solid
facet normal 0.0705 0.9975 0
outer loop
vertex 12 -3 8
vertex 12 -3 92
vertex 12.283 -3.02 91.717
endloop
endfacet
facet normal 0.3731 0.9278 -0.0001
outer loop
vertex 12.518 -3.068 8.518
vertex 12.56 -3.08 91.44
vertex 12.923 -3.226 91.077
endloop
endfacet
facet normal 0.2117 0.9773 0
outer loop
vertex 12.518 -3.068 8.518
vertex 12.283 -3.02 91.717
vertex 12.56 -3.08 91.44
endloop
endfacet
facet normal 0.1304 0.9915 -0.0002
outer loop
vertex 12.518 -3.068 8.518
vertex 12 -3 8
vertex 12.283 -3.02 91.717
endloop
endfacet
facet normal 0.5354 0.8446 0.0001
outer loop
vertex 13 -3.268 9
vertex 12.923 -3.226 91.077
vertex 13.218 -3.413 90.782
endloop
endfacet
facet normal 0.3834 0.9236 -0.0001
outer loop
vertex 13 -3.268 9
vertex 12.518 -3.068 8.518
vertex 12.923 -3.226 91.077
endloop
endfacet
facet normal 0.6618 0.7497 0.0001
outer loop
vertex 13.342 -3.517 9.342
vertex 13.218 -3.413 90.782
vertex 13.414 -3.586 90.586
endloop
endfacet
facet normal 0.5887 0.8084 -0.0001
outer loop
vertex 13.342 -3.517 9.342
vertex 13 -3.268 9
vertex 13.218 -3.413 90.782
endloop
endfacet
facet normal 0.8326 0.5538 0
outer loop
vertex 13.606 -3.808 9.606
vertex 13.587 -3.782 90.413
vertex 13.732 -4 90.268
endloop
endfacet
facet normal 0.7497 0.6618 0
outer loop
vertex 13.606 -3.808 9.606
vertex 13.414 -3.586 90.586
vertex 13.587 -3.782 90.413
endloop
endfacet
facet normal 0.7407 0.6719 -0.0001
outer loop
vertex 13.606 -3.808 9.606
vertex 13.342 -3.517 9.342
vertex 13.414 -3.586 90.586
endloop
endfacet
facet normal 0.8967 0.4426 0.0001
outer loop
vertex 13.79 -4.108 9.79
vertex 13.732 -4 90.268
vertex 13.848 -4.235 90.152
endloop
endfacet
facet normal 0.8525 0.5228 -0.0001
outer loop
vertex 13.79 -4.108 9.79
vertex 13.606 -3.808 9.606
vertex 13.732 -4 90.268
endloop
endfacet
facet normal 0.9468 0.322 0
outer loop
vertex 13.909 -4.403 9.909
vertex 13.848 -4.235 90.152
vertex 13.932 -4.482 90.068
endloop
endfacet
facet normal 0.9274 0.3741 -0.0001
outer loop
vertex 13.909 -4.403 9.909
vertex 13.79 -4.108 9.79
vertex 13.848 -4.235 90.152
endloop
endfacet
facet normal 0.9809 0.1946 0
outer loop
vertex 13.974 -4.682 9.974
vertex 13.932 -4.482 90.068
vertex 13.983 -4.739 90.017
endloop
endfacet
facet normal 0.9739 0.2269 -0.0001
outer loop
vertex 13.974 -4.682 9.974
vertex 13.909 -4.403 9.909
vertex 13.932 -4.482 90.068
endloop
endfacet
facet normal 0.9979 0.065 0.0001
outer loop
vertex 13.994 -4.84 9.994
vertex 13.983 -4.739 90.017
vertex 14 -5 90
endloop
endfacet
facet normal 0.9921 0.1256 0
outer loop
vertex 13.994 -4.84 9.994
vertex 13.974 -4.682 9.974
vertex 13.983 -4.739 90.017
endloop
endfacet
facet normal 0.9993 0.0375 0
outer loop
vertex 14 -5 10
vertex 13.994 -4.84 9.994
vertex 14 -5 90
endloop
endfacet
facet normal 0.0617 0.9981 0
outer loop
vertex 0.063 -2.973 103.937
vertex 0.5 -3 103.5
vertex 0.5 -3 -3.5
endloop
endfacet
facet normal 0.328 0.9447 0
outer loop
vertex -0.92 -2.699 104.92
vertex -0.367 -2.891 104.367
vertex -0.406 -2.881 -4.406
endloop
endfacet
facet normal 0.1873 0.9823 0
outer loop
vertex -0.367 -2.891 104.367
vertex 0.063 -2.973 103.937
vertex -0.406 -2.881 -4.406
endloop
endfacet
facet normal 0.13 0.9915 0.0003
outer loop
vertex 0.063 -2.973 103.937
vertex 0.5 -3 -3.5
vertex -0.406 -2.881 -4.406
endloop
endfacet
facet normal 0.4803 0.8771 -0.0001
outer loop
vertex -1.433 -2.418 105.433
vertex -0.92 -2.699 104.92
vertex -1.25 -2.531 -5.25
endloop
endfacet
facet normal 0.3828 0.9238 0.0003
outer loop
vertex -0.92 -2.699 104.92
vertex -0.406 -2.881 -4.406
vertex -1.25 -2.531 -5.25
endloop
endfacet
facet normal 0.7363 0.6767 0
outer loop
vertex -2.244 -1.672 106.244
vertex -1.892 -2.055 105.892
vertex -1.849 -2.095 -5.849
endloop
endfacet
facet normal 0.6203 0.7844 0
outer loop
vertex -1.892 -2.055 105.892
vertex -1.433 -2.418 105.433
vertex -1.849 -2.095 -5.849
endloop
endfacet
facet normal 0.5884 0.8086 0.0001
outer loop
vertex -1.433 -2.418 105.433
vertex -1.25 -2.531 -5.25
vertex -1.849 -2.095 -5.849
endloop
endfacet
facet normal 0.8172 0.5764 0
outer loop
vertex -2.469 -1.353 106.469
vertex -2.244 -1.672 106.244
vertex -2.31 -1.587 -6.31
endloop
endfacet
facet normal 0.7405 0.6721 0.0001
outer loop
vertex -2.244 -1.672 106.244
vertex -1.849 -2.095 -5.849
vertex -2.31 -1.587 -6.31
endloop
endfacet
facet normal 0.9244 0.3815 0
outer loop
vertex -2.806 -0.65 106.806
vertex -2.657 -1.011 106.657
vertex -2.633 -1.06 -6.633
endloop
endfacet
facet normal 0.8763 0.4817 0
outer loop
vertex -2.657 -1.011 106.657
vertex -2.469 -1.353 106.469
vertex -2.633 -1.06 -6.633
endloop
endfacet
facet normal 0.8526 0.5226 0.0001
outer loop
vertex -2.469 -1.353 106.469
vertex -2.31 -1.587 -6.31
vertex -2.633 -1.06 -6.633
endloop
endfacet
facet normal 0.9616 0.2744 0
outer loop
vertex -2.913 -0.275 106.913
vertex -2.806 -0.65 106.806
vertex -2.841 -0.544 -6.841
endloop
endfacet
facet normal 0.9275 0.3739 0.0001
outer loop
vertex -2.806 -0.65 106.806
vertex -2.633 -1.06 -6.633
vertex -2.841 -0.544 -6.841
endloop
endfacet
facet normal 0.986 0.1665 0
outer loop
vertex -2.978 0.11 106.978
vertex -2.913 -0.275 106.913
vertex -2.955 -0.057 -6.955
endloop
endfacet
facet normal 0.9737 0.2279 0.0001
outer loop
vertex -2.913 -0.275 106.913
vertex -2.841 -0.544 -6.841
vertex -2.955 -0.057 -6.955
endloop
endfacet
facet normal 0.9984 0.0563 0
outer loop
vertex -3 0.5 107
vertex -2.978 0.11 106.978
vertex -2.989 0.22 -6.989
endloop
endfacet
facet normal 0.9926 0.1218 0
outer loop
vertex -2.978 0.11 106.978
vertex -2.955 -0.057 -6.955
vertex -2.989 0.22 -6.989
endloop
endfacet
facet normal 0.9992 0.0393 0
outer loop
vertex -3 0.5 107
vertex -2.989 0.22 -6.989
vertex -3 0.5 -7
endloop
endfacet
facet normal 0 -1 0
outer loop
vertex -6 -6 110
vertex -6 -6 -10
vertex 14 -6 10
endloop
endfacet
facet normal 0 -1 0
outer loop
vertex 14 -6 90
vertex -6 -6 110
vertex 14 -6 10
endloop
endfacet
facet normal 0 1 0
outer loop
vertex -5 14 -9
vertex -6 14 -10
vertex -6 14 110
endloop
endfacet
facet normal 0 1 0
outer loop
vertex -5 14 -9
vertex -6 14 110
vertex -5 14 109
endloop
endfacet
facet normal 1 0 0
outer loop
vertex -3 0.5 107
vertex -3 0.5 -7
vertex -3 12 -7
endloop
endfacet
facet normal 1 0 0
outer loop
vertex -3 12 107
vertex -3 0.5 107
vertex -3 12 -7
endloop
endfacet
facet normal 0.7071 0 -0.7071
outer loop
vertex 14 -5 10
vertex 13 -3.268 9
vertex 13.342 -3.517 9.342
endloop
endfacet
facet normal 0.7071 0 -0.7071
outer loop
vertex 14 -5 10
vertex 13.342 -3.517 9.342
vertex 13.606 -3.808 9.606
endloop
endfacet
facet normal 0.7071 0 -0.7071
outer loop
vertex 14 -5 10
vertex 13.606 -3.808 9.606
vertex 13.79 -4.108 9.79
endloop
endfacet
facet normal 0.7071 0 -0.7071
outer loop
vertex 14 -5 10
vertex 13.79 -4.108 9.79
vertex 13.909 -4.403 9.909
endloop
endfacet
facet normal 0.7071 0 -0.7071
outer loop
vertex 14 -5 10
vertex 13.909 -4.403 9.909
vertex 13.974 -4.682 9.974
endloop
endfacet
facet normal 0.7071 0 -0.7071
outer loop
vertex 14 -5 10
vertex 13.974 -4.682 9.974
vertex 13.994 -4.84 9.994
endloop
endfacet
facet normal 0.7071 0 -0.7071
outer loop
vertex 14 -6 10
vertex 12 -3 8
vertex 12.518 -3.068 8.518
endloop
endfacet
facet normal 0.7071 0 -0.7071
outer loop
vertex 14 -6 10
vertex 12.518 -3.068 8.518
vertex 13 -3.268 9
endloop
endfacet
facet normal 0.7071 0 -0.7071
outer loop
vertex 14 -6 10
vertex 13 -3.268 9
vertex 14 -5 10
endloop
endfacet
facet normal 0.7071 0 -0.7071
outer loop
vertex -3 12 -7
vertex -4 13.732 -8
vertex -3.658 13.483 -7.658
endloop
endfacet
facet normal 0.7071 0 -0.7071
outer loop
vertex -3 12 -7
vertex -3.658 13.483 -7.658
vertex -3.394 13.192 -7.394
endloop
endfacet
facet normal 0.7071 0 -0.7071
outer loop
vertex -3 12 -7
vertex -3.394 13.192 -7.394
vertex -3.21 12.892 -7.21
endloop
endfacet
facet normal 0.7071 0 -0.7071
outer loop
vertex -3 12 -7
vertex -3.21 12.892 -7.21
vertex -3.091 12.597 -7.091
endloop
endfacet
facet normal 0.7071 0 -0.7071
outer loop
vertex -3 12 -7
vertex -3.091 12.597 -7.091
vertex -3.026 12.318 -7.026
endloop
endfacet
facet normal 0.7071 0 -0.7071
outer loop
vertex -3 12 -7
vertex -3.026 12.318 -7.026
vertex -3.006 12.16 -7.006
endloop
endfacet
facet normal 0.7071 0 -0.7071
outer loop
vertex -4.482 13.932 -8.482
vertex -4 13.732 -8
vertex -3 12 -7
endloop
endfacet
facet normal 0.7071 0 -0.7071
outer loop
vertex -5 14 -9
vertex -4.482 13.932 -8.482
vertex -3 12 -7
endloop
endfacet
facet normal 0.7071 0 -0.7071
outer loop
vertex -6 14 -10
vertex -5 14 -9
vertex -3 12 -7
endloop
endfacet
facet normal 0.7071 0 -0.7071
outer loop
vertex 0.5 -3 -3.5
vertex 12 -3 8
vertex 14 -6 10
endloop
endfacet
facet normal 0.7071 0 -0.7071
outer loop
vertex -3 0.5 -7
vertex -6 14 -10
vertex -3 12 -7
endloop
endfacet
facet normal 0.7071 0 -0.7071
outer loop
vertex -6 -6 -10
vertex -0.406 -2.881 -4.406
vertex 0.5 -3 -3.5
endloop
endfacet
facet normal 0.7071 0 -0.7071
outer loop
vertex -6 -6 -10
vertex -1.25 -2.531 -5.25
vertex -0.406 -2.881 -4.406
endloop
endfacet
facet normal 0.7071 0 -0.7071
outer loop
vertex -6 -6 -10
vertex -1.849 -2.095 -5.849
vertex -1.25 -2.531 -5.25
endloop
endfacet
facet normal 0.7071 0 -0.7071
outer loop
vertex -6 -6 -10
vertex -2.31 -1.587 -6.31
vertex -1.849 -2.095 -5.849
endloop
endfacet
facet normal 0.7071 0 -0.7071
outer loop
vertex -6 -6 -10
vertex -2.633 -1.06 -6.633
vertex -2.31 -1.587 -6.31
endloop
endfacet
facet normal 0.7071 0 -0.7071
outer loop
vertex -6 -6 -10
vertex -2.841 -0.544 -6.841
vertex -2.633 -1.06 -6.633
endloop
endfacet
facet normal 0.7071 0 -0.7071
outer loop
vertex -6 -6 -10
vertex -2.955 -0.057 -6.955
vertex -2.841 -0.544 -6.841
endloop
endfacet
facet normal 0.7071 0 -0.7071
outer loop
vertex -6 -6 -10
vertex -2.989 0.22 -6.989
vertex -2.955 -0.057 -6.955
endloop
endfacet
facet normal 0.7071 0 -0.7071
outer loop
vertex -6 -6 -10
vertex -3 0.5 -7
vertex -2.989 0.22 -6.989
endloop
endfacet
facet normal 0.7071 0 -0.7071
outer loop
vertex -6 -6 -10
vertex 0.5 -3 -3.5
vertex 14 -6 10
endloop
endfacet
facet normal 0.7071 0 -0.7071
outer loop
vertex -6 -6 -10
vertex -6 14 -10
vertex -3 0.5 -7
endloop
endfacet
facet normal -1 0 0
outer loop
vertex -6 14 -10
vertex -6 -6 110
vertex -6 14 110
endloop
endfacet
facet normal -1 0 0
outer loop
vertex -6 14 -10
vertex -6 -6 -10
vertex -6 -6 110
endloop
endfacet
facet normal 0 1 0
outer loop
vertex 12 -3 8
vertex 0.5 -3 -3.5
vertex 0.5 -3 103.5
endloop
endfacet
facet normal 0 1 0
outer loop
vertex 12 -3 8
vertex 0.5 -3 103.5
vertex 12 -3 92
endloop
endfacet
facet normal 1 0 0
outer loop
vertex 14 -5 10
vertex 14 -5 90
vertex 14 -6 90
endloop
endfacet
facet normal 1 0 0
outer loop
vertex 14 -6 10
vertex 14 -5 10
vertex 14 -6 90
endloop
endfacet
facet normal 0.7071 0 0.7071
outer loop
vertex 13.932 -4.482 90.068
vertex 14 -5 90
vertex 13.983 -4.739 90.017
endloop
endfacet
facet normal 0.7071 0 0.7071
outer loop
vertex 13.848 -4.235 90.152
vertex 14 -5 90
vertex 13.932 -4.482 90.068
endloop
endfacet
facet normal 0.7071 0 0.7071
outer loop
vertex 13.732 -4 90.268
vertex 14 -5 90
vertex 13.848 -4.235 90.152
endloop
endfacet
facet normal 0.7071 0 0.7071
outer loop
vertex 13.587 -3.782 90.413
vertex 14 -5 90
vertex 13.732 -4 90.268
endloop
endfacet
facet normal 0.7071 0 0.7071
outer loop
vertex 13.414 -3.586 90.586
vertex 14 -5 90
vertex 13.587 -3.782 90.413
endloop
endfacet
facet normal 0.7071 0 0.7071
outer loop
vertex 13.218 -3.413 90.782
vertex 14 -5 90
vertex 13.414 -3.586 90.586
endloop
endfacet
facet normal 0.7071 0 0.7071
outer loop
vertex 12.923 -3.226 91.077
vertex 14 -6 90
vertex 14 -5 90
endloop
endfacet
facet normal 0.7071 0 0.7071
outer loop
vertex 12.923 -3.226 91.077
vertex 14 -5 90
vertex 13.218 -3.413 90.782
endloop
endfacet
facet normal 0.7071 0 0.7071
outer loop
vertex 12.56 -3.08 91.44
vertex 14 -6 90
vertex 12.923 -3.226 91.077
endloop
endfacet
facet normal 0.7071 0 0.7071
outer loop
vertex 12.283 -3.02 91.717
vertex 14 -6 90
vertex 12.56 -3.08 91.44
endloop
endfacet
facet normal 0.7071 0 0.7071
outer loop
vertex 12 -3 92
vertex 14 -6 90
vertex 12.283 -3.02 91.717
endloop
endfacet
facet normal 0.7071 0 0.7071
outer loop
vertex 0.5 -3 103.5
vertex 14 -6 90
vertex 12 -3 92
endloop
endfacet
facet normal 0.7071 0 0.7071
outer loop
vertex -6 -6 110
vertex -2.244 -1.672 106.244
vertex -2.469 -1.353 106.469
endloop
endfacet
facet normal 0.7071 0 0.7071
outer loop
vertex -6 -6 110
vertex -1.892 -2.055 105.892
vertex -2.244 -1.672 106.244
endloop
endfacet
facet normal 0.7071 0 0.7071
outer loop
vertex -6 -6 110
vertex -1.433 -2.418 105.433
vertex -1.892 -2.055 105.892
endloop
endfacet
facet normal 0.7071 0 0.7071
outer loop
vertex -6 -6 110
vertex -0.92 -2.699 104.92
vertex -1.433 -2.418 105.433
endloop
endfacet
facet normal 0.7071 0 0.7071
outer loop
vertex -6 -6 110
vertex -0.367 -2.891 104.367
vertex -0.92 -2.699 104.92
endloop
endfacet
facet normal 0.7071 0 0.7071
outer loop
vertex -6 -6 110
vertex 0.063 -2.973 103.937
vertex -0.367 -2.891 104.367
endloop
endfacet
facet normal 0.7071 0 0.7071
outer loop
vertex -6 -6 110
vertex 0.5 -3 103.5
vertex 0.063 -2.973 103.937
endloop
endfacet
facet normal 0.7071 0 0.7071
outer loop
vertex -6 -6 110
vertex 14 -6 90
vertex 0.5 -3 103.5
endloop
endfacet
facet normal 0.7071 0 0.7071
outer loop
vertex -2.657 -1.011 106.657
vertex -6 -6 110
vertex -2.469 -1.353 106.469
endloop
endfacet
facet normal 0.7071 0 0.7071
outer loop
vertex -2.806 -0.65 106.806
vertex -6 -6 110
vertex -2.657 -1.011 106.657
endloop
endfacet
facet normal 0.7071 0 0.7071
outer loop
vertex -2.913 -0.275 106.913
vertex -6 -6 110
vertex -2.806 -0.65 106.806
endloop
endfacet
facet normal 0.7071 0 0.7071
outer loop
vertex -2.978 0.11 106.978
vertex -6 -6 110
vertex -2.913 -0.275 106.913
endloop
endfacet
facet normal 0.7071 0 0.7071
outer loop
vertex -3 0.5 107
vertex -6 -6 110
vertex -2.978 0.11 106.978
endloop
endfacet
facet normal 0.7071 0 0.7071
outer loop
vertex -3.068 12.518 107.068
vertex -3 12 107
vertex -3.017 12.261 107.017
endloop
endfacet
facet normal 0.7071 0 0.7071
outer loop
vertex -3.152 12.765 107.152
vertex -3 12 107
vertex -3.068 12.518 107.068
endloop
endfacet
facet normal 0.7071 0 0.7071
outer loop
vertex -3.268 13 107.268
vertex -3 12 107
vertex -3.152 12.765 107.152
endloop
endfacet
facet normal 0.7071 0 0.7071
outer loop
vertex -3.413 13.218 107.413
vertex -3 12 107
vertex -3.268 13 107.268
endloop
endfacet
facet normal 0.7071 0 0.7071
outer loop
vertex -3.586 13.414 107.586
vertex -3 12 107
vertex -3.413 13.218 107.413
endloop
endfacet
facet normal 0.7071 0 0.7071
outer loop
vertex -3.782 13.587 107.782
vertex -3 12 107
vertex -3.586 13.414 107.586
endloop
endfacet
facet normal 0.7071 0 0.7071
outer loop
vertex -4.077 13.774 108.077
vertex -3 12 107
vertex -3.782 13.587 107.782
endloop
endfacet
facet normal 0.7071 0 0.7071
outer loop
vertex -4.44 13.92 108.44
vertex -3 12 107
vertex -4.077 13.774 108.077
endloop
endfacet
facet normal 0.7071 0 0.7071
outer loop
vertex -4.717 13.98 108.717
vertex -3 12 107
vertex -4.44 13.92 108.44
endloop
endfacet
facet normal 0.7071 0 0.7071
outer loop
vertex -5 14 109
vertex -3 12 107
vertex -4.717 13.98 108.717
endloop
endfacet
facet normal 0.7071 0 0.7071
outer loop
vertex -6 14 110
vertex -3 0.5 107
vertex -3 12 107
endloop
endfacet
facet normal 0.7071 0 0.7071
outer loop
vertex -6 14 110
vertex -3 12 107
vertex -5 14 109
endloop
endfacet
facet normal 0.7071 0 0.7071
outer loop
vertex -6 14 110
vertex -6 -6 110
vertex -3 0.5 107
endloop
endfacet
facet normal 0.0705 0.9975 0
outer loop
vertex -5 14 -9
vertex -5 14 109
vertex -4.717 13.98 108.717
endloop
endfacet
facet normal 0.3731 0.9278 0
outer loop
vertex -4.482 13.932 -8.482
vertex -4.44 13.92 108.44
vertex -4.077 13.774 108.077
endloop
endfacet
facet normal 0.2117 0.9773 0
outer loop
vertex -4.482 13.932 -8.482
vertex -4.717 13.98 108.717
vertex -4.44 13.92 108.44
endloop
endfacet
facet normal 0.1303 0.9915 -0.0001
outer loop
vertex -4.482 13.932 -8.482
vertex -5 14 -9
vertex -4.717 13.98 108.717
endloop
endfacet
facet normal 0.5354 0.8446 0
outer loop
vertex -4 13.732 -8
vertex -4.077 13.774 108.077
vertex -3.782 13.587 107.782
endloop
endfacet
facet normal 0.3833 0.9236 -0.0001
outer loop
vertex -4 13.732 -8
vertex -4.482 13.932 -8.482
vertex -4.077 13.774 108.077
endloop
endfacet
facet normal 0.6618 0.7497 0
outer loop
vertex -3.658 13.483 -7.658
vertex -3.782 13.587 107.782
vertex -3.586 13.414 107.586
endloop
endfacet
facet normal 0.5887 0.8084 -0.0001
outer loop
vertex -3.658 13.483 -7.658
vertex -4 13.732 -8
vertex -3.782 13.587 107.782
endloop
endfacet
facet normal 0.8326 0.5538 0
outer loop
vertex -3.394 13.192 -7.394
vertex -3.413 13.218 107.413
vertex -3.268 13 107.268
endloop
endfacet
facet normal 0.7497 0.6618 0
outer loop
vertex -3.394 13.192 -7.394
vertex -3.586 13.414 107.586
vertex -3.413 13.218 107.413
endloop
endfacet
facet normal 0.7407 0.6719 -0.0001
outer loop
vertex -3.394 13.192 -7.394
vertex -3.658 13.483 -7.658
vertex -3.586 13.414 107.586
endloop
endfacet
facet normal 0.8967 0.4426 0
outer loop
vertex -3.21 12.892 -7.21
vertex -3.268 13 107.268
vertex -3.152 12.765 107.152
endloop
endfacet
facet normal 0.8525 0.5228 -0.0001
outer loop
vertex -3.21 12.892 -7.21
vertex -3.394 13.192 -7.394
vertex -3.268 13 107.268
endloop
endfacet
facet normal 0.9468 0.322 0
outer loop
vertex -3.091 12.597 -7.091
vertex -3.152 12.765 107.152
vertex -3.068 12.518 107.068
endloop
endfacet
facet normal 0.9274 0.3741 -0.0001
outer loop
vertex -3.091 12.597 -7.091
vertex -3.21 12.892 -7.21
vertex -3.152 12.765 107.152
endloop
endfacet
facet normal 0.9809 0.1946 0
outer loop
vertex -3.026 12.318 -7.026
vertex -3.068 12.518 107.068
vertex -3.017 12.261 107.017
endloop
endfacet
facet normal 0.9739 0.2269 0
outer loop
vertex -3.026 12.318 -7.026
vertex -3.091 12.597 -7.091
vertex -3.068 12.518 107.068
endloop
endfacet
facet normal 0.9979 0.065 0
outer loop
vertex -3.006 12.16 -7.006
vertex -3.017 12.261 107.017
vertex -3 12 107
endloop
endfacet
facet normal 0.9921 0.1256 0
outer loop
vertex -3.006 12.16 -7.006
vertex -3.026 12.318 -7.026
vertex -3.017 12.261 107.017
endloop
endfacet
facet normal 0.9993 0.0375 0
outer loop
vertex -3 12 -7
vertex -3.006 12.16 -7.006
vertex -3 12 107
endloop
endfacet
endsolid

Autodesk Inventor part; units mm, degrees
ref_plane "Start plane" through (0, 0, -10) normal (0, 0, 1) x (1, 0, 0)
ref_plane "End plane" through (0, 0, 110) normal (0, 0, 1) x (1, 0, 0)
sketch "Sketch" plane through (0, 0, 0) normal (0, 0, 1) x (1, 0, 0)
  line L0 (-3, 0.5) -> (-3, 12)
  line L1 (-6, 14) -> (-5, 14)
  line L2 (-6, -6) -> (-6, 14)
  line L3 (-6, -6) -> (14, -6)
  line L4 (14, -5) -> (14, -6)
  line L5 (0.5, -3) -> (12, -3)
  arc A0 (-3, 0.5) -> (0.5, -3) centre (0.5, 0.5) ccw
  arc A1 (-3, 12) -> (-5, 14) centre (-5, 12) ccw
  arc A2 (14, -5) -> (12, -3) centre (12, -5) ccw
  line L6 (0, 18.4971) -> (0, -10.0828) construction
  line L7 (-10.0828, 0) -> (18.4971, 0) construction
  point P0 (-3, -3)
  point P1 (-3, 14)
  point P2 (14, -3)
  dimension "d4" = 20
  dimension "d6" = 20
  dimension "d8" = 3
  dimension "d10" = 3
  dimension "d17" = 3.5
  dimension "d18" = 2
  dimension "d19" = 6
  dimension "d20" = 6
extrude "Body" add sketch "Sketch" along normal up to surface (120 mm away) from surface at -10
sketch "Sketch3" plane through (0, 0, 0) normal (0, 0, 1) x (1, 0, 0)
  line L0 (0, 0) -> (10, 0)
ref_plane "Work Plane10" through (0, 0, 0) normal (0, -1, 0) x (1, 0, 0)
sketch "Sketch4" plane through (0, 0, 0) normal (0, -1, 0) x (1, 0, 0)
  line L0 (-2, -10) -> (12, -10)
  line L1 (-2, 110) -> (12, 110)
  dimension "d24" = 120
ref_plane "Work Plane11" through (-6, 4, -10) normal (0.7071, 0, -0.7071) x (-0.7071, 0, -0.7071)
split "Split1" plane through (-6, 4, -10) removes the side toward (0.7071, 0, -0.7071)
ref_plane "Work Plane12" through (-6, 4, 110) normal (0.7071, 0, 0.7071) x (0.7071, 0, -0.7071)
split "Split2" plane through (-6, 4, 110) removes the side toward (0.7071, 0, 0.7071)
equation "\"d4\" = b"
equation "\"d6\" = b"
equation "\"d8\" = ParT"
equation "\"d10\" = ParT"
equation "\"d17\" = R"
equation "\"d18\" = R1"
equation "\"d19\" = ex"
equation "\"d20\" = d19"
equation "\"d11\" = G_L"
equation "\"b\" = 20"
equation "\"ParT\" = 3"
equation "\"R\" = 3.5"
equation "\"R1\" = 2"
equation "\"G_L\" = d24"
equation "\"ex\" = 6"
equation "\"G_OFFSET_START\" = 10"
equation "\"G_OFFSET_END\" = 10"
equation "\"d21\" = -G_OFFSET_START"
equation "\"d22\" = G_OFFSET_END + B_L"
equation "\"B_L\" = 100"
properties part number "ISO 657-1 - L20x20x3-120" material "Stainless Steel"
